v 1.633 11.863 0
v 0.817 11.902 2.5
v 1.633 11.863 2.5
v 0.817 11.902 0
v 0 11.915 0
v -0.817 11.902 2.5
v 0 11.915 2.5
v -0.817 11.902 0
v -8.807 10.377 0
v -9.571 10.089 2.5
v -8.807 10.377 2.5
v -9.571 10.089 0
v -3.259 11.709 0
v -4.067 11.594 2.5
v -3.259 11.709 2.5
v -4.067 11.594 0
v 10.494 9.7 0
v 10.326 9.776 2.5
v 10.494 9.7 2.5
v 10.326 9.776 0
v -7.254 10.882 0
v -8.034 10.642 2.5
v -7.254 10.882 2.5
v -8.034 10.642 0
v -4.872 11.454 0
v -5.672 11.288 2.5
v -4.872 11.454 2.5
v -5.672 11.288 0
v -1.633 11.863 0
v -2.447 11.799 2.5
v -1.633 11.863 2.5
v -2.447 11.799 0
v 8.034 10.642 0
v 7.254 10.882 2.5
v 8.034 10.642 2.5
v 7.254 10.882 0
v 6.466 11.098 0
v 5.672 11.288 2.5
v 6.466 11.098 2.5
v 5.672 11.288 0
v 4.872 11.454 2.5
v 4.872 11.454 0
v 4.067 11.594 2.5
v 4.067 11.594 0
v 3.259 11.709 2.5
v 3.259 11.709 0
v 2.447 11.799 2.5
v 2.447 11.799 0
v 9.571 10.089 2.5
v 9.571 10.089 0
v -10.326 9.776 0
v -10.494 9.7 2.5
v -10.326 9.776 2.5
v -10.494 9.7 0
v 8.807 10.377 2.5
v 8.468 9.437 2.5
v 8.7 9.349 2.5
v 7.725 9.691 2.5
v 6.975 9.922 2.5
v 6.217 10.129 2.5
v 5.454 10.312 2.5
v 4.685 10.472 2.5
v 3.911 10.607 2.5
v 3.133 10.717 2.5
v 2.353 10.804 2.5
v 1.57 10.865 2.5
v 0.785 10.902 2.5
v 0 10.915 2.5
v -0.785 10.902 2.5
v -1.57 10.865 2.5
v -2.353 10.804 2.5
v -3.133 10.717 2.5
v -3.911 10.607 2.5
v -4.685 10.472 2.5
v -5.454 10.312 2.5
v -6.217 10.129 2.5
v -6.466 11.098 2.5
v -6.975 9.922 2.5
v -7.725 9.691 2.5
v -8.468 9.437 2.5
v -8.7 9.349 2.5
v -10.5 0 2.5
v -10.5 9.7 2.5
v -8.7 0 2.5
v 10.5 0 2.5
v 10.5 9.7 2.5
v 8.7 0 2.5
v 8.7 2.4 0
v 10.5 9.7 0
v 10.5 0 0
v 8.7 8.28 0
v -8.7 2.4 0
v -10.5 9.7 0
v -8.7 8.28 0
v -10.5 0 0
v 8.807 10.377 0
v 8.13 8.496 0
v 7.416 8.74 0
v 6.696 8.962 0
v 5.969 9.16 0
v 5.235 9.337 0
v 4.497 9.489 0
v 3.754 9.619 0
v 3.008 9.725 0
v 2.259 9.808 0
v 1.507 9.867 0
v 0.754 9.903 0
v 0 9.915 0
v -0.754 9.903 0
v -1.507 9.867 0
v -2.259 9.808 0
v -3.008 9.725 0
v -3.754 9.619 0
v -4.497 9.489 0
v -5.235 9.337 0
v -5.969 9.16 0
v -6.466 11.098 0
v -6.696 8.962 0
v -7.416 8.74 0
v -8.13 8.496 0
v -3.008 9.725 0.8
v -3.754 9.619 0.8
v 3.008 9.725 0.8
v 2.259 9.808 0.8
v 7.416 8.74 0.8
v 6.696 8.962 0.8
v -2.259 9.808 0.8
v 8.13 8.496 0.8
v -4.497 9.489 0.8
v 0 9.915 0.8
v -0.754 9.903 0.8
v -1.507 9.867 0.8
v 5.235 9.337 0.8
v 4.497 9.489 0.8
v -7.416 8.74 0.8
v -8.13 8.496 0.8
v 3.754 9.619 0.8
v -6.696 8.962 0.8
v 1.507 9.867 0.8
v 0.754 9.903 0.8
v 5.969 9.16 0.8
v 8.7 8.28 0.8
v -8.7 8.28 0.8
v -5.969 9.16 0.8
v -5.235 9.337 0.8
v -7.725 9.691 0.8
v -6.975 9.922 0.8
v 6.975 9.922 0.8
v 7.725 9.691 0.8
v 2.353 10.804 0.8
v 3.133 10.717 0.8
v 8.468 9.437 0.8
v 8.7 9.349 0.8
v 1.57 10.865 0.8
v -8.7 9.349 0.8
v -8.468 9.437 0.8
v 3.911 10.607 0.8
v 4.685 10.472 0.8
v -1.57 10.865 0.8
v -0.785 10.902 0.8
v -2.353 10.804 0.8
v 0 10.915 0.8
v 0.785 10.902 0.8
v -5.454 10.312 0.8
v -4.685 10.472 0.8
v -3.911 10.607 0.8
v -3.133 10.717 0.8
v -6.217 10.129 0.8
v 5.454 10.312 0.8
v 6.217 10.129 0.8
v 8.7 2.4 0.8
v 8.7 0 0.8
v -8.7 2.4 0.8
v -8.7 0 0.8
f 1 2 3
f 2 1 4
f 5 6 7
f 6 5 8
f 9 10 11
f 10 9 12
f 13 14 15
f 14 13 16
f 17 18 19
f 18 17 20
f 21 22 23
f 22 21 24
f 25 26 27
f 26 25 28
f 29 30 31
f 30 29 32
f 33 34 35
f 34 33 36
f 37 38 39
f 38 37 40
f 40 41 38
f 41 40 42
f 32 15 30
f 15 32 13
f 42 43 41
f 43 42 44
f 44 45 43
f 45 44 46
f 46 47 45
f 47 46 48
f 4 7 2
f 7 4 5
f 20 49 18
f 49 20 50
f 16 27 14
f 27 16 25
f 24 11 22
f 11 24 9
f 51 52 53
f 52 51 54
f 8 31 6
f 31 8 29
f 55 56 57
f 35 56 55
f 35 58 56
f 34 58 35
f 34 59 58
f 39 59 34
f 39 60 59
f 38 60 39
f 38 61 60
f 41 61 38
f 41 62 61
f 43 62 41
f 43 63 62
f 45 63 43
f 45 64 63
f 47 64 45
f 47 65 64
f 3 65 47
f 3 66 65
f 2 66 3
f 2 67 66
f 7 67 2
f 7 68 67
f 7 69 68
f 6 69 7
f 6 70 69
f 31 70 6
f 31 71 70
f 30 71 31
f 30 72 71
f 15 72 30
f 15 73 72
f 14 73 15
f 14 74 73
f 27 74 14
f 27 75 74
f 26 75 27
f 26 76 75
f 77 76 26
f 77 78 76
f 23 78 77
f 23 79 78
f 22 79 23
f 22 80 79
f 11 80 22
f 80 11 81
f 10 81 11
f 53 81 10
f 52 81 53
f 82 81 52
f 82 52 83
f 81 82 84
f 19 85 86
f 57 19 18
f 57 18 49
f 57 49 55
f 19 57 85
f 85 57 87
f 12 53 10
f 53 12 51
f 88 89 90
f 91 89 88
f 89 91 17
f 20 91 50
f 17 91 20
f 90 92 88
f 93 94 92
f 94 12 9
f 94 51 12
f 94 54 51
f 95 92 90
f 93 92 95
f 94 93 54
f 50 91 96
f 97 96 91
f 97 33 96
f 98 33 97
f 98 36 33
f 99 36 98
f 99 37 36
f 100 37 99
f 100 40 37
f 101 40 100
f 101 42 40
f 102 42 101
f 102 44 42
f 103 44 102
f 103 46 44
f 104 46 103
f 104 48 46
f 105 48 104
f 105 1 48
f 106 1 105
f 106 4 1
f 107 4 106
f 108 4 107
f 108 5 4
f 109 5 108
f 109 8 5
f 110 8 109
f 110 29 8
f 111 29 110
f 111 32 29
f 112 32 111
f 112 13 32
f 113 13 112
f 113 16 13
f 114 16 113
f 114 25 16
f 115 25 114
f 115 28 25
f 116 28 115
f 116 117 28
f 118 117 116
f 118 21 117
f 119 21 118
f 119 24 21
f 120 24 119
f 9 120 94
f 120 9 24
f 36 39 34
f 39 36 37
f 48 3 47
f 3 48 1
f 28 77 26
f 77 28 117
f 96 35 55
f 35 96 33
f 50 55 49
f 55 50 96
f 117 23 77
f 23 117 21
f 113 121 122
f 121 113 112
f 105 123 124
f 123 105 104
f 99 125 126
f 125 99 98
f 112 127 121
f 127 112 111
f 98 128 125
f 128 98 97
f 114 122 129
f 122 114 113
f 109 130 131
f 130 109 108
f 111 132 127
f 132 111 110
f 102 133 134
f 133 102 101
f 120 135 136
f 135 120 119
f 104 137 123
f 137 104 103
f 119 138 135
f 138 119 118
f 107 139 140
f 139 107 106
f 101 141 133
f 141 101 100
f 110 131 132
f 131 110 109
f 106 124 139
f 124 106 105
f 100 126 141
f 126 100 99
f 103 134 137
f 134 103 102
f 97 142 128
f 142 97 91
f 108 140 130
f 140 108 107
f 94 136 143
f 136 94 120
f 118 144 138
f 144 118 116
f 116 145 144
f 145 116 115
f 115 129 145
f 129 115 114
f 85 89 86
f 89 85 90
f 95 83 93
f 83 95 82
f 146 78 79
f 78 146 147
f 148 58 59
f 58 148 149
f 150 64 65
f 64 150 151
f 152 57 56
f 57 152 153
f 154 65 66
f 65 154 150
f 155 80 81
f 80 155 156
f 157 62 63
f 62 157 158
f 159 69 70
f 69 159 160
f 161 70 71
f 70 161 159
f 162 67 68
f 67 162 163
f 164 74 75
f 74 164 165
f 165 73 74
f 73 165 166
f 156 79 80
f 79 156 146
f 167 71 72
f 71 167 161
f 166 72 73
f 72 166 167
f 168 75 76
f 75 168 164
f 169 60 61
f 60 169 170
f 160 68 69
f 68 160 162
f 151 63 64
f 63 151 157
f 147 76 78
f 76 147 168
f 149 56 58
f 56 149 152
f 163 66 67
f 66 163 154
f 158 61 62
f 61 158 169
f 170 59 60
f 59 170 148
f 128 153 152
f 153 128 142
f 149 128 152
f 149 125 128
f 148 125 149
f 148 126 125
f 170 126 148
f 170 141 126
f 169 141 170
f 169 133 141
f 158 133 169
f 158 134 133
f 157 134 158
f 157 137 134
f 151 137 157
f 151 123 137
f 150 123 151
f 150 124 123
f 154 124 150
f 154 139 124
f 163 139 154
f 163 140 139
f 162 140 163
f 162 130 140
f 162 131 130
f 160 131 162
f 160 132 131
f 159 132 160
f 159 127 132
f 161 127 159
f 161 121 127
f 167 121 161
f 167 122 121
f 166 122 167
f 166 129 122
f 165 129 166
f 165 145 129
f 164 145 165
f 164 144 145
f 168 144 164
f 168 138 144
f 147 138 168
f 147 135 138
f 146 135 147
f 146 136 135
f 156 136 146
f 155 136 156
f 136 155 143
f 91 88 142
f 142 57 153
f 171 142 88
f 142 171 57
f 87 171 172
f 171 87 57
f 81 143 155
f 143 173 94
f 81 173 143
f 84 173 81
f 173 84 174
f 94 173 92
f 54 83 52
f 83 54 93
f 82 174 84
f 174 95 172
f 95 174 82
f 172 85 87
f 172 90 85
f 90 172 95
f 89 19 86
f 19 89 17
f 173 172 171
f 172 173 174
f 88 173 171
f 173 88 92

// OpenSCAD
// file: OO_large_coupling.scad
/*
Copyright Luke Wallin 2020

This file is part of Luke Wallin's 3DPrintedTrains project.

The 3DPrintedTrains project is free software: you can redistribute it and/or modify
it under the terms of the GNU General Public License as published by
the Free Software Foundation, either version 3 of the License, or
(at your option) any later version.

The 3DPrintedTrains project is distributed in the hope that it will be useful,
but WITHOUT ANY WARRANTY; without even the implied warranty of
MERCHANTABILITY or FITNESS FOR A PARTICULAR PURPOSE.  See the
GNU General Public License for more details.

You should have received a copy of the GNU General Public License
along with The 3DPrintedTrains project.  If not, see <https:www.gnu.org/licenses/>.
*/

//20.7cm wide

module frontarc(height, radius, width, thickness){
    //arcsegment
    intersection(){

        difference(){
            cylinder(h=height, r=radius, center=false, $fn=200);

            cylinder(h=height*3, r=radius-thickness, center=true, $fn=200);
        }
        
        translate([0,50,0]){
            cube([width,radius*4,height*3], true);
        }
        
    }
}


//the arc with arms and a base. No mechanism to hold hook or connect to train
//arm_thickness=1.8, arm_length = 9.7, coupling_height = 2.5, coupling_width=21, arc_radius = 26, min_thickness = min_thickness, base_width = 2.4, flange_max=2, flange_min=1, min_front_thickness=min_front_thickness
module coupling_base(arm_thickness=1.8, arm_length= 9.7, coupling_height= 2.5, coupling_width=21, arc_radius= 26, min_thickness = 1.5, base_width= 2.4, flange_max=2, flange_min=1, min_front_thickness=0.8){



    arc_offset = sqrt(arc_radius*arc_radius- (coupling_width/2)*(coupling_width/2));

    echo(arc_offset);

    translate([0,arm_length-arc_offset,0]){
        //front arc with notch taken out
        difference(){
            frontarc(height=coupling_height, radius=arc_radius, width=coupling_width, thickness=flange_max);
            translate([0,0,min_front_thickness]){
                frontarc(height=2.5, radius=arc_radius-flange_min, width=coupling_width-arm_thickness*2, thickness=flange_max);
            }
        }
    }

    //arms

    translate([-coupling_width/2,0,0]){
        cube([arm_thickness,arm_length,coupling_height] );
    }

    translate([coupling_width/2-arm_thickness,0,0]){
        cube([arm_thickness,arm_length,coupling_height] );
    }

    //base
    translate([-coupling_width/2,0,0]){
        cube([coupling_width, base_width, min_thickness]);
    }

}

//hook base with sticking out bit for hook to clip on. didn't print well
//x,y are bottom left
module hook_base(x, y, width, length, height, hook_holder_radius, hook_holder_length, hook_holder_end_cap_thickness, hook_holder_height, hook_holder_y){
    
    translate([x,y,0]){
        cube([width, length, height]);
    };
    translate([x+
    width, -hook_holder_y, hook_holder_height]){
        rotate([0,90,0]){
            union(){
                cylinder(h=hook_holder_length, r=hook_holder_radius, $fn=200);
                translate([0,0,hook_holder_length-hook_holder_end_cap_thickness]){
                    cylinder(h=hook_holder_end_cap_thickness, r=hook_holder_radius*1.5, $fn=200);
                }
            }
        }
    }
}

//hook base with a hole on the coupling, works fine but needs an extra bit of wire carefully bent
//x,y are bottom left
module hook_base_hole(x, y, width, length, height, hook_holder_radius, hook_holder_length, hook_holder_end_cap_thickness, hook_holder_height, hook_holder_y){
    difference(){
        translate([x,y,0]){
            cube([width, length, height]);
        };
        translate([x-width, -hook_holder_y, hook_holder_height]){
            rotate([0,90,0]){
              cylinder(h=width*10, r=hook_holder_radius, $fn=200);
            }
        }
    }
}

//attempt at a better clip, so no extra wire will be needed
module hook_base_clip(x, y, width, length, height, hook_holder_radius, hook_holder_length, hook_holder_end_cap_thickness, hook_holder_height, hook_holder_y){

        translate([x,y,0]){
            cube([width, length, height]);
        };
        translate([x+width, -hook_holder_y, hook_holder_height]){
            rotate([0,90,0]){
              cylinder(h=hook_holder_end_cap_thickness, r=hook_holder_radius, $fn=200);
            }
        }
        translate([x+width+hook_holder_end_cap_thickness,y,0]){
            cube([hook_holder_end_cap_thickness, length, hook_holder_height+hook_holder_radius]);
        };
    
}


//basic coupling shape, with no means to attach
module wide_coupling(){
	min_thickness = 1.5;
	difference() {
     
		union(){
				coupling_base(arm_thickness=1.8, arm_length = 9.7, coupling_height = 2.5, coupling_width=21, arc_radius = 26, min_thickness = min_thickness, base_width = 2.4, flange_max=2, flange_min=1, min_front_thickness=min_front_thickness);
		
				
		};
	}
}
// main file
/*
Copyright Luke Wallin 2020

This file is part of Luke Wallin's 3DPrintedTrains project.

The 3DPrintedTrains project is free software: you can redistribute it and/or modify
it under the terms of the GNU General Public License as published by
the Free Software Foundation, either version 3 of the License, or
(at your option) any later version.

The 3DPrintedTrains project is distributed in the hope that it will be useful,
but WITHOUT ANY WARRANTY; without even the implied warranty of
MERCHANTABILITY or FITNESS FOR A PARTICULAR PURPOSE.  See the
GNU General Public License for more details.

You should have received a copy of the GNU General Public License
along with The 3DPrintedTrains project.  If not, see <https:www.gnu.org/licenses/>.
*/

include <OO_large_coupling.scad>


min_thickness = 0.8;




hole_diameter = 2.7;
second_hole_diameters=1.9;
second_hole_distance=7.1;
main_arm_width = 6;
main_arm_length = 5.2;

coupling_base(arm_thickness=1.8, arm_length = 9.7, coupling_height = 2.5, coupling_width=21, arc_radius = 26, min_thickness = min_thickness, base_width = 2.4, flange_max=2, flange_min=1);
